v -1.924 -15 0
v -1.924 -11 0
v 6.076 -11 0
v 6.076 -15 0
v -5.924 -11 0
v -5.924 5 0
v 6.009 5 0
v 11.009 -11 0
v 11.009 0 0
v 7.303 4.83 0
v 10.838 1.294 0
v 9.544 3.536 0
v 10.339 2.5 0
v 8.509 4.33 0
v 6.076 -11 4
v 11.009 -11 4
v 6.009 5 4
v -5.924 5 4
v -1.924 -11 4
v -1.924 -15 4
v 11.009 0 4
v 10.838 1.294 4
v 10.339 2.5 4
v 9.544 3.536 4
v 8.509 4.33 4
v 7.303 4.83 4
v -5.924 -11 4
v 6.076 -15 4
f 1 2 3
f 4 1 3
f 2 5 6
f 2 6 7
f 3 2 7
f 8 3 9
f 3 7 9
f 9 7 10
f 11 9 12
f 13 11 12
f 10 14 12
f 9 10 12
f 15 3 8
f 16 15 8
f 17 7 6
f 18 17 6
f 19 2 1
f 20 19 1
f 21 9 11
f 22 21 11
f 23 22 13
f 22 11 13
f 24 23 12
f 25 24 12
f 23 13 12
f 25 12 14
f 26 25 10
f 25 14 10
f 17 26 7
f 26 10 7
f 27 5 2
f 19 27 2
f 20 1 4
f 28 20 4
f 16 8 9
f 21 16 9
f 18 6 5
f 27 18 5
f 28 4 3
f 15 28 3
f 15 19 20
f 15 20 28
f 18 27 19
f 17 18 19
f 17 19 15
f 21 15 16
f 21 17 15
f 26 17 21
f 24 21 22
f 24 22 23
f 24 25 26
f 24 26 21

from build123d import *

# Parameters (mm, degrees)
BOSS_EXTRUDE1_DEPTH = 4


with BuildPart() as part:
    # Sketch1 → Boss-Extrude1 (new body)
    with BuildSketch(Plane.XY):
        with BuildLine():
            Line((6.07568334, -11), (11.008857545, -11))
            Line((11.008857545, -11), (11.008857545, 0))
            ThreePointArc((11.008857545, 0), (9.544391451, 3.535533906), (6.008857545, 5))
            Line((6.008857545, 5), (-5.92431666, 5))
            Line((-5.92431666, 5), (-5.92431666, -11))
            Line((-5.92431666, -11), (-1.92431666, -11))
            Line((-1.92431666, -11), (-1.92431666, -15))
            Line((-1.92431666, -15), (6.07568334, -15))
            Line((6.07568334, -15), (6.07568334, -11))
        make_face()
    extrude(amount=BOSS_EXTRUDE1_DEPTH)


solid = part.part
